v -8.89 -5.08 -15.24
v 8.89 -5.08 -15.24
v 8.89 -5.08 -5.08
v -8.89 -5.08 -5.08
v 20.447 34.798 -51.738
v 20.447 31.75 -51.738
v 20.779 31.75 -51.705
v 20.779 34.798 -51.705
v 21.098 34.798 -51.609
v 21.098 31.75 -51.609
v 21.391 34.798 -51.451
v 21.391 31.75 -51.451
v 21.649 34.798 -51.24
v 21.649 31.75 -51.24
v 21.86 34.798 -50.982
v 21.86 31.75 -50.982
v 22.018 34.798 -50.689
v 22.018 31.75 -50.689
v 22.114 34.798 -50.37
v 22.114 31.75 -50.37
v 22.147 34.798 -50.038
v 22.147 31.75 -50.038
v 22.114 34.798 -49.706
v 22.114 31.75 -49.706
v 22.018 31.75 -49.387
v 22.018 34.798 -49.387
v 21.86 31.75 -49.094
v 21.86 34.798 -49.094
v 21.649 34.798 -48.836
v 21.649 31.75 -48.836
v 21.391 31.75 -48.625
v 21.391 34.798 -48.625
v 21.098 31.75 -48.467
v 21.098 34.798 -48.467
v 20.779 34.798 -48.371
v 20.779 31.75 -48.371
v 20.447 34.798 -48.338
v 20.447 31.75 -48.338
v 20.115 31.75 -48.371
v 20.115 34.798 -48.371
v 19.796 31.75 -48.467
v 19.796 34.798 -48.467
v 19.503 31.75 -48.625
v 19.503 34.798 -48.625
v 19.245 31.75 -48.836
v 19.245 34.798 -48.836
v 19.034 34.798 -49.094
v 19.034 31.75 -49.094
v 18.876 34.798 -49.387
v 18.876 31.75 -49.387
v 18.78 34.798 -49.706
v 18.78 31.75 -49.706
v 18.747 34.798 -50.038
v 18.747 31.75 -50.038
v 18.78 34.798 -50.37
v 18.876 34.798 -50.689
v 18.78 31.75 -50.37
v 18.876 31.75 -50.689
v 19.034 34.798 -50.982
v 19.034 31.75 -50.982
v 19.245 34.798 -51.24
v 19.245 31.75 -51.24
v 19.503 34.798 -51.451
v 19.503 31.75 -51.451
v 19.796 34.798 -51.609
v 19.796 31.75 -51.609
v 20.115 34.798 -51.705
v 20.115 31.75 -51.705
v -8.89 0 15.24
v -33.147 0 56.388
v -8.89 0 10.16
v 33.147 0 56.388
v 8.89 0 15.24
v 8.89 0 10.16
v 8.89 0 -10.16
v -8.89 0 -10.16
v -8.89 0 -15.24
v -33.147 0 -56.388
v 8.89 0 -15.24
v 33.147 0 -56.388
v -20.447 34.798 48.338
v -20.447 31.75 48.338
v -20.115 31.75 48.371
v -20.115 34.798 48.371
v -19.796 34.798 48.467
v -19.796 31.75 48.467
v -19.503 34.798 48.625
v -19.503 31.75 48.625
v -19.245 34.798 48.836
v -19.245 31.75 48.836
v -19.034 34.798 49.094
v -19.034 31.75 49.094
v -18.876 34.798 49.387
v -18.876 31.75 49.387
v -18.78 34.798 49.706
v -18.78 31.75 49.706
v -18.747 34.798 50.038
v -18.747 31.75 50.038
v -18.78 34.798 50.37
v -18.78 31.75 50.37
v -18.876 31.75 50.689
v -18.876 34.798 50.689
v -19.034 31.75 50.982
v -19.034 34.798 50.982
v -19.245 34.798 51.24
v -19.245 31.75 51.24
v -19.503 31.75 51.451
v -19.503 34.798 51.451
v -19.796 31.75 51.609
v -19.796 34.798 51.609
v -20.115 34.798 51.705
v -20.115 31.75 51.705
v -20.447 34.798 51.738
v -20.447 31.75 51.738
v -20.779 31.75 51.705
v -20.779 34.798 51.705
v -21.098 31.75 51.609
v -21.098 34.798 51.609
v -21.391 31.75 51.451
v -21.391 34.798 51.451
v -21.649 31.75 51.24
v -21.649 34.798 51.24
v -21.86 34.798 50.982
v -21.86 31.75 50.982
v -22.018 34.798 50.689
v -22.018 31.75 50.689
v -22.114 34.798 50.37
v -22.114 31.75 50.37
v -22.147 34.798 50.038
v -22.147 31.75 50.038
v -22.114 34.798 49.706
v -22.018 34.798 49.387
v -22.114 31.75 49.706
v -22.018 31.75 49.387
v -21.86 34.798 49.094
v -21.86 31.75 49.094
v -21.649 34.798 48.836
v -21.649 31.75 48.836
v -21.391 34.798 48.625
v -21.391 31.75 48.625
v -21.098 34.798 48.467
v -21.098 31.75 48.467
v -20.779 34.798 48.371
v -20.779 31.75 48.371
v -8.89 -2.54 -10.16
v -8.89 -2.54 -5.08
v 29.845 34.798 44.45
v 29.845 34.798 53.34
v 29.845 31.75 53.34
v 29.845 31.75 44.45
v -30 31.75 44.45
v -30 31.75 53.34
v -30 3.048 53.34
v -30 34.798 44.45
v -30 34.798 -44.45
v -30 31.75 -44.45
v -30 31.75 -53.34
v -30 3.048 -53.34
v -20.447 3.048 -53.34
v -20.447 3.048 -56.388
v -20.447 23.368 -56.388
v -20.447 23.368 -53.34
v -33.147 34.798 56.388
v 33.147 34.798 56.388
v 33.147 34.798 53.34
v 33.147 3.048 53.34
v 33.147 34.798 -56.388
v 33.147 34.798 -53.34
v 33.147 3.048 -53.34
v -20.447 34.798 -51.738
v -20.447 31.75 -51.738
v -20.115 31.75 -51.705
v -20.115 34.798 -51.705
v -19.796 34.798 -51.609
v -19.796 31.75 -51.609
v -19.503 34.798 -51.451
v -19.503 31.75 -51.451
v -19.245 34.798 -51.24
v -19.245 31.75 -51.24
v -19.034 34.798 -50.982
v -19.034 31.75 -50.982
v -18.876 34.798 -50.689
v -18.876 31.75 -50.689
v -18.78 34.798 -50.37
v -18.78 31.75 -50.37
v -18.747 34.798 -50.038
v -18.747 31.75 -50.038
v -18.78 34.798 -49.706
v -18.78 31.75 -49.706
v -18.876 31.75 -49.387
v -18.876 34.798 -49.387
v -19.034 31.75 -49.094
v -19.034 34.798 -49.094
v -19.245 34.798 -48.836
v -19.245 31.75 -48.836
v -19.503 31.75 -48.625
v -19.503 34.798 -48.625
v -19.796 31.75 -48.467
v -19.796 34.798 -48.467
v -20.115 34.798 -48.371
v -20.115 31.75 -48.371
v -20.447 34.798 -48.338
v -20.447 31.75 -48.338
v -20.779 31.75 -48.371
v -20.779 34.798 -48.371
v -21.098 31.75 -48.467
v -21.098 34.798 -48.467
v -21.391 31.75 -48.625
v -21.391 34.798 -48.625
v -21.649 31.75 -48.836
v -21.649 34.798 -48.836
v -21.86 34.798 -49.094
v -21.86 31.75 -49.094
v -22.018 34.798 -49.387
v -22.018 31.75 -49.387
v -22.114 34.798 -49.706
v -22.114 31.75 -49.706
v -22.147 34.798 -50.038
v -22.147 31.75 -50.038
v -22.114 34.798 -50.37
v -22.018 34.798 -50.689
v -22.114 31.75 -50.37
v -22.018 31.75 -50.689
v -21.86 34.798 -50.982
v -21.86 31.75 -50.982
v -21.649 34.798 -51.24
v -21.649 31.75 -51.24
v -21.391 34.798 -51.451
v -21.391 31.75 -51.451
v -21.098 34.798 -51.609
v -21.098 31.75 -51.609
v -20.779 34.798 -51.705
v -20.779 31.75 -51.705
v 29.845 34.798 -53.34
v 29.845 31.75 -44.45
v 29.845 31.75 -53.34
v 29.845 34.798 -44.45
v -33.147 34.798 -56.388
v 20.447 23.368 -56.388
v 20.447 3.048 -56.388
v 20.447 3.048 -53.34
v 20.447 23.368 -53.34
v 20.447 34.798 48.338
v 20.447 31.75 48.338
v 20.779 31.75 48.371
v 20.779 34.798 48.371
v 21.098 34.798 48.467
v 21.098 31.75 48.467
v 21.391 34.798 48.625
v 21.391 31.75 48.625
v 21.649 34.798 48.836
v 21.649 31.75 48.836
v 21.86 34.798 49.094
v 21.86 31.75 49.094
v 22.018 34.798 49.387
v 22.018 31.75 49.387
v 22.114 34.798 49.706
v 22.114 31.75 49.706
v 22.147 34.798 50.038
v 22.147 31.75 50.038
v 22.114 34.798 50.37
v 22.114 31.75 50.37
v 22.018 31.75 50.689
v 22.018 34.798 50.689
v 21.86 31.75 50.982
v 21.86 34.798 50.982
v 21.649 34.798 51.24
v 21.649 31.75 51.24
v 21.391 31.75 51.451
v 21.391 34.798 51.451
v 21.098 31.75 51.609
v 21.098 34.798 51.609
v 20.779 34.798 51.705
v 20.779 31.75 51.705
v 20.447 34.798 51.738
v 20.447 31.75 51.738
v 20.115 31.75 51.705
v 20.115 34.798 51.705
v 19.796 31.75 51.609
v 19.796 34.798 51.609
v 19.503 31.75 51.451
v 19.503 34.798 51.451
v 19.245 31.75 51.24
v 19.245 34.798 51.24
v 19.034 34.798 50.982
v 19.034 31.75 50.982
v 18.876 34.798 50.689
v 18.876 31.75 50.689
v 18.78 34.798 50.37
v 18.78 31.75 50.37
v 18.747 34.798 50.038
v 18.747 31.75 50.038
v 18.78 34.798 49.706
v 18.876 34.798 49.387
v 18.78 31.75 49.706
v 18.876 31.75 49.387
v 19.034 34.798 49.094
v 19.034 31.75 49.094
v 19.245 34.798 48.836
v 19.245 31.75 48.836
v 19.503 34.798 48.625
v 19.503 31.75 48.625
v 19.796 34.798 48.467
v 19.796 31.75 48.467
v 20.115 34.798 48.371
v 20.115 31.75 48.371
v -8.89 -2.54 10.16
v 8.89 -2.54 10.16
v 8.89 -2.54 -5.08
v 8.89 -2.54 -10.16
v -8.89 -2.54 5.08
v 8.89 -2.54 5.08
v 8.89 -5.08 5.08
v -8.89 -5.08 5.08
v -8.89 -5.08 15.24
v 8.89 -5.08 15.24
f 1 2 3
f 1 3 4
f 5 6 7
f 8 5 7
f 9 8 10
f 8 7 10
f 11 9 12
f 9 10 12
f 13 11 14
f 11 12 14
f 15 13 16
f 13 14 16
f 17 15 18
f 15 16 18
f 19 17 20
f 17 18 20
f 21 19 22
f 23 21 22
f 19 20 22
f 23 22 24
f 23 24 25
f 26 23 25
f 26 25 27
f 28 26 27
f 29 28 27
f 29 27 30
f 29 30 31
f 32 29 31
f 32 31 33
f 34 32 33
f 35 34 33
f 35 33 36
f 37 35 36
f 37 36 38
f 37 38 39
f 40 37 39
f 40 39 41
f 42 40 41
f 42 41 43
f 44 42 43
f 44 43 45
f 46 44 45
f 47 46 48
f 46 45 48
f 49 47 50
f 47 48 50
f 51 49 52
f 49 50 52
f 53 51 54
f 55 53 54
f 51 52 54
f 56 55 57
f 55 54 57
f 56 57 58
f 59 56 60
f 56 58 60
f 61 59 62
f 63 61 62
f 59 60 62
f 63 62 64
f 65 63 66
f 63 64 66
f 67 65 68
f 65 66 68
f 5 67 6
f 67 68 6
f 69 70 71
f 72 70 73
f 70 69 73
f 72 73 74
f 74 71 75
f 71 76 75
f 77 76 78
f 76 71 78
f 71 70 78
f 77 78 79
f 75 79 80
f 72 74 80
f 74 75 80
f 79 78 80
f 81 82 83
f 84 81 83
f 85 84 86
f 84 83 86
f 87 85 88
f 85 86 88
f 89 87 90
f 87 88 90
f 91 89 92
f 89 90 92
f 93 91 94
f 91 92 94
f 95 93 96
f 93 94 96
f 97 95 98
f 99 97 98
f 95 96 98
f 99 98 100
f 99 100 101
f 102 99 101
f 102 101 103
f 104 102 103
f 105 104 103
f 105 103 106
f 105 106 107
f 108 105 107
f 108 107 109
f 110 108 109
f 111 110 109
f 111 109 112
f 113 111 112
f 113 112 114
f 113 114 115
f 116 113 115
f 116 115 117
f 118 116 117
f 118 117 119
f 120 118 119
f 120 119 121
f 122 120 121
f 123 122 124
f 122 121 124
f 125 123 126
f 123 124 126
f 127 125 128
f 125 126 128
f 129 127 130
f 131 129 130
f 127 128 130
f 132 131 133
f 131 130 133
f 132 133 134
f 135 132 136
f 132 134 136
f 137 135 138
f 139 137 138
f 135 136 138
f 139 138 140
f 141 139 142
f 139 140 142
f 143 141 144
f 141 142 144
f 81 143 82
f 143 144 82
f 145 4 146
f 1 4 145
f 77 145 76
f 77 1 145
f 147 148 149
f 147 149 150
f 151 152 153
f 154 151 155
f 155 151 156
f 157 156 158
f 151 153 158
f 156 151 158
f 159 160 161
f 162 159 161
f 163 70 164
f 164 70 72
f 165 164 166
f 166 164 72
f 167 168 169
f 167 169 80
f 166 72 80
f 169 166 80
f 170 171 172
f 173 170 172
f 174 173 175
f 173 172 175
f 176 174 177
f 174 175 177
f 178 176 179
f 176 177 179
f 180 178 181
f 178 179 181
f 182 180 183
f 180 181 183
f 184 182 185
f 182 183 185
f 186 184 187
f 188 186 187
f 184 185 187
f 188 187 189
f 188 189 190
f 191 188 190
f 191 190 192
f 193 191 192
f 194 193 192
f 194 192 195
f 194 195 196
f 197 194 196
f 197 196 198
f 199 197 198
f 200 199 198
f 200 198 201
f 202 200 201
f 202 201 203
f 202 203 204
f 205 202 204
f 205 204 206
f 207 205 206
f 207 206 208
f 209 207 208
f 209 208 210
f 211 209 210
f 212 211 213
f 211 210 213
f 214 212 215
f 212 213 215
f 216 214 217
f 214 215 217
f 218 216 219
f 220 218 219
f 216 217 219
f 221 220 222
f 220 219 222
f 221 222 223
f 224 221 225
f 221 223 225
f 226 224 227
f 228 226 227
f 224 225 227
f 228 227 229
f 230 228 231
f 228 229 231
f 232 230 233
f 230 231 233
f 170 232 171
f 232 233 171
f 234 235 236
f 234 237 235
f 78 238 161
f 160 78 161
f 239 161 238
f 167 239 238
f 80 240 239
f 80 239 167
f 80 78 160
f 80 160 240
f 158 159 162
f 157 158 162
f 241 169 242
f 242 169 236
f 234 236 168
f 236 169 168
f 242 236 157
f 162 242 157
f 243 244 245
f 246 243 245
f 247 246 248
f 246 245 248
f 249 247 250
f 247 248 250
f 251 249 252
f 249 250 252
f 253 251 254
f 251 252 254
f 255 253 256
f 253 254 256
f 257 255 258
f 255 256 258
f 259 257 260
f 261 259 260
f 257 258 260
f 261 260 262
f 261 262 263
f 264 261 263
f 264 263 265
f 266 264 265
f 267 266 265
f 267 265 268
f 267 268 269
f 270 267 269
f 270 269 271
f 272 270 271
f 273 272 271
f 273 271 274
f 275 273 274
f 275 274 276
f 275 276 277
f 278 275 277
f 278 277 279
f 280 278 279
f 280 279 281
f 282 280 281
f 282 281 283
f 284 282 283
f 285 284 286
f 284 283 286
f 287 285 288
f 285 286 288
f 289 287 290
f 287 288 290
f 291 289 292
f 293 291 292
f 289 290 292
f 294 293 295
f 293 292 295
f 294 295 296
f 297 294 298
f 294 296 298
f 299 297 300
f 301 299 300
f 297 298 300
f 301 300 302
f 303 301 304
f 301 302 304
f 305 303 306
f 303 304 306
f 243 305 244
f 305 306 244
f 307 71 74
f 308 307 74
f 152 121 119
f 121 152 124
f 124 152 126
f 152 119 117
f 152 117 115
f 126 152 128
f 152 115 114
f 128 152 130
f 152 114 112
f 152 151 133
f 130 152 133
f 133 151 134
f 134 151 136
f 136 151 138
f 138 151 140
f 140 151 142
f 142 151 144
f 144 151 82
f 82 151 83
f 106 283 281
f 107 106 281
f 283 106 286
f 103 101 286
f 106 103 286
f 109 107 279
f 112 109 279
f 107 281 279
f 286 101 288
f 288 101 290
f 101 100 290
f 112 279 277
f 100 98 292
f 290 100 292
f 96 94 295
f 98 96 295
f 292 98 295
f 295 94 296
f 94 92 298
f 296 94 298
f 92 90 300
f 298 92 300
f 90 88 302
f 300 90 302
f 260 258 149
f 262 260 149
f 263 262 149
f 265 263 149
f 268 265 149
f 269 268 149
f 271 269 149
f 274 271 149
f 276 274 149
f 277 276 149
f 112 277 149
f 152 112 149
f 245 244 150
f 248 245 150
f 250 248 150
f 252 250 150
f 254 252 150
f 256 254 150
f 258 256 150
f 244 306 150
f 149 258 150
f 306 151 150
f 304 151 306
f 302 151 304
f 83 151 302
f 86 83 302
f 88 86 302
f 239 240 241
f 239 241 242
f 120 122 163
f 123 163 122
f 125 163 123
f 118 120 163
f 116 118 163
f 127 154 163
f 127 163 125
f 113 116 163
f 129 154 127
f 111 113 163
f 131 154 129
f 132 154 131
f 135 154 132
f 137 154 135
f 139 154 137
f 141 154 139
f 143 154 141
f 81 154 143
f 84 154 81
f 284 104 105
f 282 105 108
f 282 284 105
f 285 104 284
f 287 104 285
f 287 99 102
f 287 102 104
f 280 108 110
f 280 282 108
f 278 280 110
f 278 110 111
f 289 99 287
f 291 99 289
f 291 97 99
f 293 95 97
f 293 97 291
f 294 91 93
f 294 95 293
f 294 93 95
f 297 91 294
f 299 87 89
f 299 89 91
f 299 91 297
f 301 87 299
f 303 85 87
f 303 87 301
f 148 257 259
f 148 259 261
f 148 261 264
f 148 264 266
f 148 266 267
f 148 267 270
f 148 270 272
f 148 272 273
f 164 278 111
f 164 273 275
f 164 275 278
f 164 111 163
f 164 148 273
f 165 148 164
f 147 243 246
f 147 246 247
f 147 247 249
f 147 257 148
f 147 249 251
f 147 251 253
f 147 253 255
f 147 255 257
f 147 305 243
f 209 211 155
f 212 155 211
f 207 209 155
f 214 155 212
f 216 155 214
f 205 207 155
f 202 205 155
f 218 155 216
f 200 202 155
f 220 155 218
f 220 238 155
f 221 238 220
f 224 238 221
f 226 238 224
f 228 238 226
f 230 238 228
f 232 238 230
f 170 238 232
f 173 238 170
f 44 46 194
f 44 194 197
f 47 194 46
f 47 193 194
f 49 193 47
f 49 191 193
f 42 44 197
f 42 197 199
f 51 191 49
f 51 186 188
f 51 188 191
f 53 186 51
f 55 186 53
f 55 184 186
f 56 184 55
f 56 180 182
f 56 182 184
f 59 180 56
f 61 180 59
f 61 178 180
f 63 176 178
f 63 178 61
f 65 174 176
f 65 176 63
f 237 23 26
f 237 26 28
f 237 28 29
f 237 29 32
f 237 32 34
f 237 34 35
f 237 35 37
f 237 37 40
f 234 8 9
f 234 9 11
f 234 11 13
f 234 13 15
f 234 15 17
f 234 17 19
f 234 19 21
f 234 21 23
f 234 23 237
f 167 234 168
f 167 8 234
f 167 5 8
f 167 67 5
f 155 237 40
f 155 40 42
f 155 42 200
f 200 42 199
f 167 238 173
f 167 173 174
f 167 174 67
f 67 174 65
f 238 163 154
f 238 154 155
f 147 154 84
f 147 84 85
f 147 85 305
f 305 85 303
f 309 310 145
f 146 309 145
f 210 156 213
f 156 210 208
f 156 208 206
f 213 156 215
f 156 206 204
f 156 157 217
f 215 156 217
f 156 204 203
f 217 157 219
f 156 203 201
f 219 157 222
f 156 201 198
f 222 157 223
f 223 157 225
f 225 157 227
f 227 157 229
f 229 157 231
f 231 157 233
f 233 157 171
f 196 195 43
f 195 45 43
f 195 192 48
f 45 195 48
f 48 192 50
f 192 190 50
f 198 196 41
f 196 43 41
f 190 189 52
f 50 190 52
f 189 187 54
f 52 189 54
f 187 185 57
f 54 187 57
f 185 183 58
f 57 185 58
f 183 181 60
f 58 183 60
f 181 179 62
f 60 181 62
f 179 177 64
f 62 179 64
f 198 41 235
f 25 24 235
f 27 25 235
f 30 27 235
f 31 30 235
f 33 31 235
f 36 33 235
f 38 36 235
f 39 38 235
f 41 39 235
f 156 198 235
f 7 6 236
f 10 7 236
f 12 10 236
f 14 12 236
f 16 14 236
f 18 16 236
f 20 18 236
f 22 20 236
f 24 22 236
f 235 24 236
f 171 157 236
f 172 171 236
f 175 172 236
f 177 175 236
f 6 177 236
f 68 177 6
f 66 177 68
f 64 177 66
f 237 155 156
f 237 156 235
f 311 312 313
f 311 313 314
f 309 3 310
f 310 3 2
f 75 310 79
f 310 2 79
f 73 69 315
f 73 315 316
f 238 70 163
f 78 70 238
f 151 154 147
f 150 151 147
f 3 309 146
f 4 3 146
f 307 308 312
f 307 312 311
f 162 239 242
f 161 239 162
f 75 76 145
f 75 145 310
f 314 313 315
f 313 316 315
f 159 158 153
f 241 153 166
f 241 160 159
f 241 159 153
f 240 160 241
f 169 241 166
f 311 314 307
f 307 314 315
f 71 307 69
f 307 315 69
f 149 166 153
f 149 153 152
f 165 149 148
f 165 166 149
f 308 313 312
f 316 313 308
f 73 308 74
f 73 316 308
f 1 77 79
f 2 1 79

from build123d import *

# Parameters (mm, degrees)
SKETCH1_W                = 66.294
SKETCH1_H                = 112.776
BOSS_EXTRUDE1_DEPTH      = 3.048
SKETCH2_W                = 66.294
SKETCH2_H                = 112.776
SKETCH2_W_2              = 60
SKETCH2_H_2              = 106.68
BOSS_EXTRUDE2_DEPTH      = 31.75
SKETCH3_W                = 60
SKETCH3_H                = 8.89
BOSS_EXTRUDE3_DEPTH      = 3.048
SKETCH6_W                = 106.68
SKETCH6_H                = 31.75
CUT_EXTRUDE1_DEPTH       = 3.302
M3_CLEARANCE_HOLE1_D     = 3.4
M3_CLEARANCE_HOLE1_DEPTH = 3.048
CUT_EXTRUDE4_REACH       = 124.589
SKETCH12_W               = 40.894
SKETCH12_H               = 20.32
SKETCH13_W               = 17.78
SKETCH13_H               = 5.08
BOSS_EXTRUDE4_DEPTH      = 5.08
SKETCH14_W               = 17.78
SKETCH14_H               = 2.54
BOSS_EXTRUDE6_DEPTH      = 5.08


with BuildPart() as part:
    # Sketch1 → Boss-Extrude1 (new body)
    with BuildSketch(Plane(origin=(0, 0, 0), x_dir=(1, 0, 0), z_dir=(0, 1, 0))):
        Rectangle(SKETCH1_W, SKETCH1_H)
    extrude(amount=BOSS_EXTRUDE1_DEPTH)

    # Sketch2 → Boss-Extrude2 (add)
    with BuildSketch(Plane(origin=(0, 3.048, 0), x_dir=(1, 0, 0), z_dir=(0, 1, 0))):
        Rectangle(SKETCH2_W, SKETCH2_H)
        Rectangle(SKETCH2_W_2, SKETCH2_H_2, mode=Mode.SUBTRACT)
    extrude(amount=BOSS_EXTRUDE2_DEPTH)

    # Sketch3 → Boss-Extrude3 (add)
    with BuildSketch(Plane(origin=(0, 34.798, 0), x_dir=(1, 0, 0), z_dir=(0, 1, 0))):
        with Locations((0, 48.895)):
            Rectangle(SKETCH3_W, SKETCH3_H)
        with Locations((0, -48.895)):
            Rectangle(SKETCH3_W, SKETCH3_H)
    extrude(amount=-BOSS_EXTRUDE3_DEPTH)

    # Sketch6 → Cut-Extrude1 (cut)
    with BuildSketch(Plane(origin=(33.147, 0, 0), x_dir=(0, 0, -1), z_dir=(1, 0, 0))):
        with Locations((0, 18.923)):
            Rectangle(SKETCH6_W, SKETCH6_H)
    extrude(amount=-CUT_EXTRUDE1_DEPTH, mode=Mode.SUBTRACT)

    # M3 Clearance Hole1
    with Locations(Plane(origin=(-20.447, 34.798, -50.038), x_dir=(0, 0, 1), z_dir=(0, 1, 0))):
        with Locations((0, 0), (0, 40.894), (100.076, 0), (100.076, 40.894)):
            Hole(M3_CLEARANCE_HOLE1_D / 2, depth=M3_CLEARANCE_HOLE1_DEPTH)

    # Sketch12 → Cut-Extrude4 (cut, up to next)
    with BuildSketch(Plane(origin=(0, 0, -56.388), x_dir=(-1, 0, 0), z_dir=(0, 0, -1)), mode=Mode.PRIVATE) as cut_extrude4_sk1:
        with Locations((0, 13.208)):
            Rectangle(SKETCH12_W, SKETCH12_H)
    cut_extrude4_tool1 = extrude(cut_extrude4_sk1.sketch, amount=-CUT_EXTRUDE4_REACH, mode=Mode.PRIVATE) & part.part
    add(cut_extrude4_tool1.solids().sort_by_distance((0, 13.208, -56.388))[0], mode=Mode.SUBTRACT)

    # Sketch13 → Boss-Extrude4 (add)
    with BuildSketch(Plane.XZ):
        with Locations((0, 12.7)):
            Rectangle(SKETCH13_W, SKETCH13_H)
        with Locations((0, -12.7)):
            Rectangle(SKETCH13_W, SKETCH13_H)
    extrude(amount=BOSS_EXTRUDE4_DEPTH)

    # Sketch14 → Boss-Extrude6 (add)
    with BuildSketch(Plane(origin=(0, 0, 10.16), x_dir=(-1, 0, 0), z_dir=(0, 0, -1))):
        with Locations((0, -3.81)):
            Rectangle(SKETCH14_W, SKETCH14_H)
    boss_extrude6 = extrude(amount=BOSS_EXTRUDE6_DEPTH)

    # Mirror2: Boss-Extrude6 across plane
    add(boss_extrude6.mirror(Plane(origin=(0, 0, 0), x_dir=(1, 0, 0), z_dir=(0, 0, -1))))


solid = part.part
